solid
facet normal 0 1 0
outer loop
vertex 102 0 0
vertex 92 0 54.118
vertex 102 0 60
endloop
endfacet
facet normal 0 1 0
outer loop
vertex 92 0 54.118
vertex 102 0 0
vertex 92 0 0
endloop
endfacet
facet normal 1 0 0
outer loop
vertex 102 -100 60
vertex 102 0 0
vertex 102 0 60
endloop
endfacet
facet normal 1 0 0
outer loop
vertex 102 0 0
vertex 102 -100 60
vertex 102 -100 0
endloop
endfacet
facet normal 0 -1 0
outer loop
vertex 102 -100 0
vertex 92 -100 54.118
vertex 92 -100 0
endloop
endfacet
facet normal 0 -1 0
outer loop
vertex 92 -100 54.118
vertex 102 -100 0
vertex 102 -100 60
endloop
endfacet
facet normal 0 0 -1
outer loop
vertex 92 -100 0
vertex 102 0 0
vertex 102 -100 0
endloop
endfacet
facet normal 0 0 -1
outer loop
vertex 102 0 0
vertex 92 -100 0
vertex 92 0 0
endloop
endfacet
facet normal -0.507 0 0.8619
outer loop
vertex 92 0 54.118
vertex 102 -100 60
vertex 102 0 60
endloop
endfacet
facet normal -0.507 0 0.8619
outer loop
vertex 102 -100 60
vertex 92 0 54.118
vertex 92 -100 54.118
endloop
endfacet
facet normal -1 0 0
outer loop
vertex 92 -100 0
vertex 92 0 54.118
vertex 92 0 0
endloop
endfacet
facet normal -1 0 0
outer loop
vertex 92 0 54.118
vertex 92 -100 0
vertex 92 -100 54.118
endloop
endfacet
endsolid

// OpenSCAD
sunroom_height = 60;
bathroom_height = 75;

target = sunroom_height;
width_to_height = 1.7; // experimental, test me
length = 100;


width = target*width_to_height;
module step() {
    rotate([90,0,0])
    linear_extrude(length)
    polygon([[0,0],[width,0],[width,target]]);
}

// actually this will take too long to print. for prototyping, just use a piece of cardboard and some back supports

difference() {
    step();
    #translate([0,-length,0]) cube([width-10, length, target]);
}
